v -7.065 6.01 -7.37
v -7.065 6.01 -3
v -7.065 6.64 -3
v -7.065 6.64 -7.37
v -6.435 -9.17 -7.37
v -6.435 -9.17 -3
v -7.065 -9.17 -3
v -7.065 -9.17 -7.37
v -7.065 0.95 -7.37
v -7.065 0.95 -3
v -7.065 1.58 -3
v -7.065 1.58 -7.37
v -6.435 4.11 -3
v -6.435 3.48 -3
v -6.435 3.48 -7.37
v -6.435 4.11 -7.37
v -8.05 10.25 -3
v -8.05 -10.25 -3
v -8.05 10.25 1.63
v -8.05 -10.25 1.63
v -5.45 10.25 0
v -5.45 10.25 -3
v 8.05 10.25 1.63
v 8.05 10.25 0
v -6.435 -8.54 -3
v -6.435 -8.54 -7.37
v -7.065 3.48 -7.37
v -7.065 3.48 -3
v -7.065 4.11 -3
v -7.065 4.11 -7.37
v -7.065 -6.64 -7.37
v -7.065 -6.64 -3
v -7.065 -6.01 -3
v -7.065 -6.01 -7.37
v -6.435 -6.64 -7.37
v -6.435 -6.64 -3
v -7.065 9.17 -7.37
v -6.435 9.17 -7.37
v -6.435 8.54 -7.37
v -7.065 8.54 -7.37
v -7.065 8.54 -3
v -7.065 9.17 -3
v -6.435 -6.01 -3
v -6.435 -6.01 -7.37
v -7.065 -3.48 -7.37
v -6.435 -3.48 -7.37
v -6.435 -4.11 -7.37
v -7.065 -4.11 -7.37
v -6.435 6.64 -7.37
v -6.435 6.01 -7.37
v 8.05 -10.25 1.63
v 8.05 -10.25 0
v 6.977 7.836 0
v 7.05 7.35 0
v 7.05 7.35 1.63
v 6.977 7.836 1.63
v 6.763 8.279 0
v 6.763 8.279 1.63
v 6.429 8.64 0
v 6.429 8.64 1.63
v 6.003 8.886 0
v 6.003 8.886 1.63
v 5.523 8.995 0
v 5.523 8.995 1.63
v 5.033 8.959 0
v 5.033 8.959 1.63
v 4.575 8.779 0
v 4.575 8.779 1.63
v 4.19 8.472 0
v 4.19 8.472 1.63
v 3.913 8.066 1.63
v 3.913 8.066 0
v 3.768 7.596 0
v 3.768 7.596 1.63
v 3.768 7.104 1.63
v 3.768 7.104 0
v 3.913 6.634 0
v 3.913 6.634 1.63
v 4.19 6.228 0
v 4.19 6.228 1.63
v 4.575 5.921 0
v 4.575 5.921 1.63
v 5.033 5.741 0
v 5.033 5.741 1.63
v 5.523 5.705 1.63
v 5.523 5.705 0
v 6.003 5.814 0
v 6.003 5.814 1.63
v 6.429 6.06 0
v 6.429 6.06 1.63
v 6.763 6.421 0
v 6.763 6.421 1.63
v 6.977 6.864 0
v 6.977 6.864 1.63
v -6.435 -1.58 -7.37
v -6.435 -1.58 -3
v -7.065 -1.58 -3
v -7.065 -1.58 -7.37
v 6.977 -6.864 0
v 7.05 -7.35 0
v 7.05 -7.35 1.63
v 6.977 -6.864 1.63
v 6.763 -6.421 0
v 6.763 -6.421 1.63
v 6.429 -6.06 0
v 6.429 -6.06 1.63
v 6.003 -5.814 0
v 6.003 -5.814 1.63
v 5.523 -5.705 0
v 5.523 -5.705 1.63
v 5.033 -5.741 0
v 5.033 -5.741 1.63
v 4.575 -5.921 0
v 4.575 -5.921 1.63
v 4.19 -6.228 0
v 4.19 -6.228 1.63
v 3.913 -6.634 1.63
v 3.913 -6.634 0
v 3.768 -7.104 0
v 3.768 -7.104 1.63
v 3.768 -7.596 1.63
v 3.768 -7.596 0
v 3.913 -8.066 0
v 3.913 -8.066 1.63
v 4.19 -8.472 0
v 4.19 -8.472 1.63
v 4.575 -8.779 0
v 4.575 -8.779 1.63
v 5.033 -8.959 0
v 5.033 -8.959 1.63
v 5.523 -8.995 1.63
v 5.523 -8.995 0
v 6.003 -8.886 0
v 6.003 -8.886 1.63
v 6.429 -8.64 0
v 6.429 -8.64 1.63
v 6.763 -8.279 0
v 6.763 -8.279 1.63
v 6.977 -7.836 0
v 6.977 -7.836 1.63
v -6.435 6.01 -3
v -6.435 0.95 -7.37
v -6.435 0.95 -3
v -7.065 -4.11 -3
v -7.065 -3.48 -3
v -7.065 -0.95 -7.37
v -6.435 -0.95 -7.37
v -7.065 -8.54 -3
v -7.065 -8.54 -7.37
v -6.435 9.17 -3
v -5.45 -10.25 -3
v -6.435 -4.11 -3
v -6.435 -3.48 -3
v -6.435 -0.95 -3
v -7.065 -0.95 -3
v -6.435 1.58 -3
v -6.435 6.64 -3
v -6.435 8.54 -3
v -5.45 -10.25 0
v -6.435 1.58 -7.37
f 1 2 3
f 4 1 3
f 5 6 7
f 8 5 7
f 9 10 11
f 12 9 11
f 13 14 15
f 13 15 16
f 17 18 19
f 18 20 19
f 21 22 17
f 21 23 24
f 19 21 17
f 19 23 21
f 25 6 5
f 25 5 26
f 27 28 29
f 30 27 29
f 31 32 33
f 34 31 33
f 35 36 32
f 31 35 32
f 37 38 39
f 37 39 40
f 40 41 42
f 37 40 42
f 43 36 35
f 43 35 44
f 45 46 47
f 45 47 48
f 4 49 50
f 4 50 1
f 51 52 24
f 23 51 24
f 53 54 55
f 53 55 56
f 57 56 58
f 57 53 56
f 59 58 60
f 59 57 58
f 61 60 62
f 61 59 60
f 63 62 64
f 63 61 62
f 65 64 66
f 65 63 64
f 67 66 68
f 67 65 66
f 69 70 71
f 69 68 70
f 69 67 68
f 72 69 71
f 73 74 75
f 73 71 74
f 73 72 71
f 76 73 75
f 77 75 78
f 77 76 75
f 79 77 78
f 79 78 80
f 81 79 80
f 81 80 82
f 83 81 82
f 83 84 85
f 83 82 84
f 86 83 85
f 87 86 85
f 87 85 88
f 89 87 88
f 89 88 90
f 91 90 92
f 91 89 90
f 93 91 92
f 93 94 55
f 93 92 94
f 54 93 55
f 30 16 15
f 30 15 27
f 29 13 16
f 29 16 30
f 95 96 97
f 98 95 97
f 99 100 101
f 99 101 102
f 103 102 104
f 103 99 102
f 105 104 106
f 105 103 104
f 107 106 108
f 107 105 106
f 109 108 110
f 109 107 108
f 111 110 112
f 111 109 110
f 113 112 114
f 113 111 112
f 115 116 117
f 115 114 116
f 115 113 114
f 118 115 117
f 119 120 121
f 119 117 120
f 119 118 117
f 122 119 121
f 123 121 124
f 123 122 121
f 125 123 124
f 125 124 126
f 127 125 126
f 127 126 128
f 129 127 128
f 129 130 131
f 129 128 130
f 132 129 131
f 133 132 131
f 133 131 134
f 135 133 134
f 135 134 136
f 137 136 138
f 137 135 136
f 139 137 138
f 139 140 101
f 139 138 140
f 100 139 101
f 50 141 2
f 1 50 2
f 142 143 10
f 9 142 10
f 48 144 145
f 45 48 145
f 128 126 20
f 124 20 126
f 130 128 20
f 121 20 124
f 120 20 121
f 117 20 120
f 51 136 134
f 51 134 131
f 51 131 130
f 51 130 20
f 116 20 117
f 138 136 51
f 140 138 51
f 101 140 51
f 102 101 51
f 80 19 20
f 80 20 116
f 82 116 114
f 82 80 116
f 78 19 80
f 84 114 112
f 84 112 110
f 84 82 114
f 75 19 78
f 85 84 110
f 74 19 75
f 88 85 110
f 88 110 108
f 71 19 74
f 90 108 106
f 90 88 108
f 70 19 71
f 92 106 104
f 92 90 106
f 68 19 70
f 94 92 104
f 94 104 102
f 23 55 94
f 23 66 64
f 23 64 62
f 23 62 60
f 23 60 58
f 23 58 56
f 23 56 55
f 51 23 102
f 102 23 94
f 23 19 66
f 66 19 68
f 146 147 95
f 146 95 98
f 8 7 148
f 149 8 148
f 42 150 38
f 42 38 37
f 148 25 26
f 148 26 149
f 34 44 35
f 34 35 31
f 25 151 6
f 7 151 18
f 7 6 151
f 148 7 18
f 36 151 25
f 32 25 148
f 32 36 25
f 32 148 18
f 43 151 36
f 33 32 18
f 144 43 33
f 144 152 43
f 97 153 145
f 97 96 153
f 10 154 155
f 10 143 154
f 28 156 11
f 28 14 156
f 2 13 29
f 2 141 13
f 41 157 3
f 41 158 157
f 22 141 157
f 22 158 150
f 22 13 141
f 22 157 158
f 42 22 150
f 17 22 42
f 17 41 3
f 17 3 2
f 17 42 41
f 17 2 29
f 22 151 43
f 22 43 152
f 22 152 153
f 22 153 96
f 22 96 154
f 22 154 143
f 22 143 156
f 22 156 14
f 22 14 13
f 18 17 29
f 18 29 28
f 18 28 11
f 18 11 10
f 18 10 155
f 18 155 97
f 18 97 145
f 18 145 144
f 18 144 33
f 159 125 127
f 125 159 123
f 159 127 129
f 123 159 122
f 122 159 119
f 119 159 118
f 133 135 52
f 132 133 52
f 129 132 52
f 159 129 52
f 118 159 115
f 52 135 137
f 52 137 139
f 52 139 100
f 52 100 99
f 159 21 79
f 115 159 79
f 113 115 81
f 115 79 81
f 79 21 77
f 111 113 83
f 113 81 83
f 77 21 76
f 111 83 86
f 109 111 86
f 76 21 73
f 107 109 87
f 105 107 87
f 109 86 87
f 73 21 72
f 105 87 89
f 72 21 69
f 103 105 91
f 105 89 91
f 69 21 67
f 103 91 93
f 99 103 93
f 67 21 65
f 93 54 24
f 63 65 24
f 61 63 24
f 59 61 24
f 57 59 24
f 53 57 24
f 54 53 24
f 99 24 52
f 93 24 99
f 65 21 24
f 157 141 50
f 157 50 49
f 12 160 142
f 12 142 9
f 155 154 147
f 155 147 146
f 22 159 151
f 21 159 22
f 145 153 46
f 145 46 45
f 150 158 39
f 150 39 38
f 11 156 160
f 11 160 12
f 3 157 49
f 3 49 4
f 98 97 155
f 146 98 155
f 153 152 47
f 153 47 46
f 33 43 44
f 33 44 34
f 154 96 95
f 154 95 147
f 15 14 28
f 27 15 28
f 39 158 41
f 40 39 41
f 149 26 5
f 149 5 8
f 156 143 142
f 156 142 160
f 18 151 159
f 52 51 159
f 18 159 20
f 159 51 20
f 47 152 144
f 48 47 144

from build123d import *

# Parameters (mm, degrees)
SKETCH1_W               = 16.1
SKETCH1_H               = 20.5
BOSS_EXTRUDE1_DEPTH     = 1.63
CUT_EXTRUDE1_DEPTH      = 14.134759229
CUT_EXTRUDE1_DEPTH_BACK = 14.134759229
SKETCH2_R               = 1.65
SKETCH3_W               = 2.6
SKETCH3_H               = 20.5
BOSS_EXTRUDE2_DEPTH     = 3
SKETCH4_W               = 0.63
SKETCH4_H               = 0.63
BOSS_EXTRUDE3_DEPTH     = 4.37


with BuildPart() as part:
    # Sketch1 → Boss-Extrude1 (new body)
    with BuildSketch(Plane.XY):
        Rectangle(SKETCH1_W, SKETCH1_H)
    extrude(amount=BOSS_EXTRUDE1_DEPTH)

    # Sketch2 → Cut-Extrude1 (cut, two sides: drawn at the far end of the back side and taken through both)
    with BuildSketch(Plane.XY.offset(1.63).offset(-CUT_EXTRUDE1_DEPTH_BACK)):
        with Locations((5.4, 7.35)):
            Circle(SKETCH2_R)
        with Locations((5.4, -7.35)):
            Circle(SKETCH2_R)
    extrude(amount=CUT_EXTRUDE1_DEPTH + CUT_EXTRUDE1_DEPTH_BACK, mode=Mode.SUBTRACT)

    # Sketch3 → Boss-Extrude2 (add)
    with BuildSketch(Plane(origin=(0, 0, 0), x_dir=(-1, 0, 0), z_dir=(0, 0, -1))):
        with Locations((6.75, 0)):
            Rectangle(SKETCH3_W, SKETCH3_H)
    extrude(amount=BOSS_EXTRUDE2_DEPTH)

    # Sketch4 → Boss-Extrude3 (add)
    with BuildSketch(Plane(origin=(0, 0, -3), x_dir=(-1, 0, 0), z_dir=(0, 0, -1))):
        with Locations((6.75, 8.855)):
            Rectangle(SKETCH4_W, SKETCH4_H)
        with Locations((6.75, 6.325)):
            Rectangle(SKETCH4_W, SKETCH4_H)
        with Locations((6.75, 3.795)):
            Rectangle(SKETCH4_W, SKETCH4_H)
        with Locations((6.75, 1.265)):
            Rectangle(SKETCH4_W, SKETCH4_H)
        with Locations((6.75, -1.265)):
            Rectangle(SKETCH4_W, SKETCH4_H)
        with Locations((6.75, -3.795)):
            Rectangle(SKETCH4_W, SKETCH4_H)
        with Locations((6.75, -6.325)):
            Rectangle(SKETCH4_W, SKETCH4_H)
        with Locations((6.75, -8.855)):
            Rectangle(SKETCH4_W, SKETCH4_H)
    extrude(amount=BOSS_EXTRUDE3_DEPTH)


solid = part.part
